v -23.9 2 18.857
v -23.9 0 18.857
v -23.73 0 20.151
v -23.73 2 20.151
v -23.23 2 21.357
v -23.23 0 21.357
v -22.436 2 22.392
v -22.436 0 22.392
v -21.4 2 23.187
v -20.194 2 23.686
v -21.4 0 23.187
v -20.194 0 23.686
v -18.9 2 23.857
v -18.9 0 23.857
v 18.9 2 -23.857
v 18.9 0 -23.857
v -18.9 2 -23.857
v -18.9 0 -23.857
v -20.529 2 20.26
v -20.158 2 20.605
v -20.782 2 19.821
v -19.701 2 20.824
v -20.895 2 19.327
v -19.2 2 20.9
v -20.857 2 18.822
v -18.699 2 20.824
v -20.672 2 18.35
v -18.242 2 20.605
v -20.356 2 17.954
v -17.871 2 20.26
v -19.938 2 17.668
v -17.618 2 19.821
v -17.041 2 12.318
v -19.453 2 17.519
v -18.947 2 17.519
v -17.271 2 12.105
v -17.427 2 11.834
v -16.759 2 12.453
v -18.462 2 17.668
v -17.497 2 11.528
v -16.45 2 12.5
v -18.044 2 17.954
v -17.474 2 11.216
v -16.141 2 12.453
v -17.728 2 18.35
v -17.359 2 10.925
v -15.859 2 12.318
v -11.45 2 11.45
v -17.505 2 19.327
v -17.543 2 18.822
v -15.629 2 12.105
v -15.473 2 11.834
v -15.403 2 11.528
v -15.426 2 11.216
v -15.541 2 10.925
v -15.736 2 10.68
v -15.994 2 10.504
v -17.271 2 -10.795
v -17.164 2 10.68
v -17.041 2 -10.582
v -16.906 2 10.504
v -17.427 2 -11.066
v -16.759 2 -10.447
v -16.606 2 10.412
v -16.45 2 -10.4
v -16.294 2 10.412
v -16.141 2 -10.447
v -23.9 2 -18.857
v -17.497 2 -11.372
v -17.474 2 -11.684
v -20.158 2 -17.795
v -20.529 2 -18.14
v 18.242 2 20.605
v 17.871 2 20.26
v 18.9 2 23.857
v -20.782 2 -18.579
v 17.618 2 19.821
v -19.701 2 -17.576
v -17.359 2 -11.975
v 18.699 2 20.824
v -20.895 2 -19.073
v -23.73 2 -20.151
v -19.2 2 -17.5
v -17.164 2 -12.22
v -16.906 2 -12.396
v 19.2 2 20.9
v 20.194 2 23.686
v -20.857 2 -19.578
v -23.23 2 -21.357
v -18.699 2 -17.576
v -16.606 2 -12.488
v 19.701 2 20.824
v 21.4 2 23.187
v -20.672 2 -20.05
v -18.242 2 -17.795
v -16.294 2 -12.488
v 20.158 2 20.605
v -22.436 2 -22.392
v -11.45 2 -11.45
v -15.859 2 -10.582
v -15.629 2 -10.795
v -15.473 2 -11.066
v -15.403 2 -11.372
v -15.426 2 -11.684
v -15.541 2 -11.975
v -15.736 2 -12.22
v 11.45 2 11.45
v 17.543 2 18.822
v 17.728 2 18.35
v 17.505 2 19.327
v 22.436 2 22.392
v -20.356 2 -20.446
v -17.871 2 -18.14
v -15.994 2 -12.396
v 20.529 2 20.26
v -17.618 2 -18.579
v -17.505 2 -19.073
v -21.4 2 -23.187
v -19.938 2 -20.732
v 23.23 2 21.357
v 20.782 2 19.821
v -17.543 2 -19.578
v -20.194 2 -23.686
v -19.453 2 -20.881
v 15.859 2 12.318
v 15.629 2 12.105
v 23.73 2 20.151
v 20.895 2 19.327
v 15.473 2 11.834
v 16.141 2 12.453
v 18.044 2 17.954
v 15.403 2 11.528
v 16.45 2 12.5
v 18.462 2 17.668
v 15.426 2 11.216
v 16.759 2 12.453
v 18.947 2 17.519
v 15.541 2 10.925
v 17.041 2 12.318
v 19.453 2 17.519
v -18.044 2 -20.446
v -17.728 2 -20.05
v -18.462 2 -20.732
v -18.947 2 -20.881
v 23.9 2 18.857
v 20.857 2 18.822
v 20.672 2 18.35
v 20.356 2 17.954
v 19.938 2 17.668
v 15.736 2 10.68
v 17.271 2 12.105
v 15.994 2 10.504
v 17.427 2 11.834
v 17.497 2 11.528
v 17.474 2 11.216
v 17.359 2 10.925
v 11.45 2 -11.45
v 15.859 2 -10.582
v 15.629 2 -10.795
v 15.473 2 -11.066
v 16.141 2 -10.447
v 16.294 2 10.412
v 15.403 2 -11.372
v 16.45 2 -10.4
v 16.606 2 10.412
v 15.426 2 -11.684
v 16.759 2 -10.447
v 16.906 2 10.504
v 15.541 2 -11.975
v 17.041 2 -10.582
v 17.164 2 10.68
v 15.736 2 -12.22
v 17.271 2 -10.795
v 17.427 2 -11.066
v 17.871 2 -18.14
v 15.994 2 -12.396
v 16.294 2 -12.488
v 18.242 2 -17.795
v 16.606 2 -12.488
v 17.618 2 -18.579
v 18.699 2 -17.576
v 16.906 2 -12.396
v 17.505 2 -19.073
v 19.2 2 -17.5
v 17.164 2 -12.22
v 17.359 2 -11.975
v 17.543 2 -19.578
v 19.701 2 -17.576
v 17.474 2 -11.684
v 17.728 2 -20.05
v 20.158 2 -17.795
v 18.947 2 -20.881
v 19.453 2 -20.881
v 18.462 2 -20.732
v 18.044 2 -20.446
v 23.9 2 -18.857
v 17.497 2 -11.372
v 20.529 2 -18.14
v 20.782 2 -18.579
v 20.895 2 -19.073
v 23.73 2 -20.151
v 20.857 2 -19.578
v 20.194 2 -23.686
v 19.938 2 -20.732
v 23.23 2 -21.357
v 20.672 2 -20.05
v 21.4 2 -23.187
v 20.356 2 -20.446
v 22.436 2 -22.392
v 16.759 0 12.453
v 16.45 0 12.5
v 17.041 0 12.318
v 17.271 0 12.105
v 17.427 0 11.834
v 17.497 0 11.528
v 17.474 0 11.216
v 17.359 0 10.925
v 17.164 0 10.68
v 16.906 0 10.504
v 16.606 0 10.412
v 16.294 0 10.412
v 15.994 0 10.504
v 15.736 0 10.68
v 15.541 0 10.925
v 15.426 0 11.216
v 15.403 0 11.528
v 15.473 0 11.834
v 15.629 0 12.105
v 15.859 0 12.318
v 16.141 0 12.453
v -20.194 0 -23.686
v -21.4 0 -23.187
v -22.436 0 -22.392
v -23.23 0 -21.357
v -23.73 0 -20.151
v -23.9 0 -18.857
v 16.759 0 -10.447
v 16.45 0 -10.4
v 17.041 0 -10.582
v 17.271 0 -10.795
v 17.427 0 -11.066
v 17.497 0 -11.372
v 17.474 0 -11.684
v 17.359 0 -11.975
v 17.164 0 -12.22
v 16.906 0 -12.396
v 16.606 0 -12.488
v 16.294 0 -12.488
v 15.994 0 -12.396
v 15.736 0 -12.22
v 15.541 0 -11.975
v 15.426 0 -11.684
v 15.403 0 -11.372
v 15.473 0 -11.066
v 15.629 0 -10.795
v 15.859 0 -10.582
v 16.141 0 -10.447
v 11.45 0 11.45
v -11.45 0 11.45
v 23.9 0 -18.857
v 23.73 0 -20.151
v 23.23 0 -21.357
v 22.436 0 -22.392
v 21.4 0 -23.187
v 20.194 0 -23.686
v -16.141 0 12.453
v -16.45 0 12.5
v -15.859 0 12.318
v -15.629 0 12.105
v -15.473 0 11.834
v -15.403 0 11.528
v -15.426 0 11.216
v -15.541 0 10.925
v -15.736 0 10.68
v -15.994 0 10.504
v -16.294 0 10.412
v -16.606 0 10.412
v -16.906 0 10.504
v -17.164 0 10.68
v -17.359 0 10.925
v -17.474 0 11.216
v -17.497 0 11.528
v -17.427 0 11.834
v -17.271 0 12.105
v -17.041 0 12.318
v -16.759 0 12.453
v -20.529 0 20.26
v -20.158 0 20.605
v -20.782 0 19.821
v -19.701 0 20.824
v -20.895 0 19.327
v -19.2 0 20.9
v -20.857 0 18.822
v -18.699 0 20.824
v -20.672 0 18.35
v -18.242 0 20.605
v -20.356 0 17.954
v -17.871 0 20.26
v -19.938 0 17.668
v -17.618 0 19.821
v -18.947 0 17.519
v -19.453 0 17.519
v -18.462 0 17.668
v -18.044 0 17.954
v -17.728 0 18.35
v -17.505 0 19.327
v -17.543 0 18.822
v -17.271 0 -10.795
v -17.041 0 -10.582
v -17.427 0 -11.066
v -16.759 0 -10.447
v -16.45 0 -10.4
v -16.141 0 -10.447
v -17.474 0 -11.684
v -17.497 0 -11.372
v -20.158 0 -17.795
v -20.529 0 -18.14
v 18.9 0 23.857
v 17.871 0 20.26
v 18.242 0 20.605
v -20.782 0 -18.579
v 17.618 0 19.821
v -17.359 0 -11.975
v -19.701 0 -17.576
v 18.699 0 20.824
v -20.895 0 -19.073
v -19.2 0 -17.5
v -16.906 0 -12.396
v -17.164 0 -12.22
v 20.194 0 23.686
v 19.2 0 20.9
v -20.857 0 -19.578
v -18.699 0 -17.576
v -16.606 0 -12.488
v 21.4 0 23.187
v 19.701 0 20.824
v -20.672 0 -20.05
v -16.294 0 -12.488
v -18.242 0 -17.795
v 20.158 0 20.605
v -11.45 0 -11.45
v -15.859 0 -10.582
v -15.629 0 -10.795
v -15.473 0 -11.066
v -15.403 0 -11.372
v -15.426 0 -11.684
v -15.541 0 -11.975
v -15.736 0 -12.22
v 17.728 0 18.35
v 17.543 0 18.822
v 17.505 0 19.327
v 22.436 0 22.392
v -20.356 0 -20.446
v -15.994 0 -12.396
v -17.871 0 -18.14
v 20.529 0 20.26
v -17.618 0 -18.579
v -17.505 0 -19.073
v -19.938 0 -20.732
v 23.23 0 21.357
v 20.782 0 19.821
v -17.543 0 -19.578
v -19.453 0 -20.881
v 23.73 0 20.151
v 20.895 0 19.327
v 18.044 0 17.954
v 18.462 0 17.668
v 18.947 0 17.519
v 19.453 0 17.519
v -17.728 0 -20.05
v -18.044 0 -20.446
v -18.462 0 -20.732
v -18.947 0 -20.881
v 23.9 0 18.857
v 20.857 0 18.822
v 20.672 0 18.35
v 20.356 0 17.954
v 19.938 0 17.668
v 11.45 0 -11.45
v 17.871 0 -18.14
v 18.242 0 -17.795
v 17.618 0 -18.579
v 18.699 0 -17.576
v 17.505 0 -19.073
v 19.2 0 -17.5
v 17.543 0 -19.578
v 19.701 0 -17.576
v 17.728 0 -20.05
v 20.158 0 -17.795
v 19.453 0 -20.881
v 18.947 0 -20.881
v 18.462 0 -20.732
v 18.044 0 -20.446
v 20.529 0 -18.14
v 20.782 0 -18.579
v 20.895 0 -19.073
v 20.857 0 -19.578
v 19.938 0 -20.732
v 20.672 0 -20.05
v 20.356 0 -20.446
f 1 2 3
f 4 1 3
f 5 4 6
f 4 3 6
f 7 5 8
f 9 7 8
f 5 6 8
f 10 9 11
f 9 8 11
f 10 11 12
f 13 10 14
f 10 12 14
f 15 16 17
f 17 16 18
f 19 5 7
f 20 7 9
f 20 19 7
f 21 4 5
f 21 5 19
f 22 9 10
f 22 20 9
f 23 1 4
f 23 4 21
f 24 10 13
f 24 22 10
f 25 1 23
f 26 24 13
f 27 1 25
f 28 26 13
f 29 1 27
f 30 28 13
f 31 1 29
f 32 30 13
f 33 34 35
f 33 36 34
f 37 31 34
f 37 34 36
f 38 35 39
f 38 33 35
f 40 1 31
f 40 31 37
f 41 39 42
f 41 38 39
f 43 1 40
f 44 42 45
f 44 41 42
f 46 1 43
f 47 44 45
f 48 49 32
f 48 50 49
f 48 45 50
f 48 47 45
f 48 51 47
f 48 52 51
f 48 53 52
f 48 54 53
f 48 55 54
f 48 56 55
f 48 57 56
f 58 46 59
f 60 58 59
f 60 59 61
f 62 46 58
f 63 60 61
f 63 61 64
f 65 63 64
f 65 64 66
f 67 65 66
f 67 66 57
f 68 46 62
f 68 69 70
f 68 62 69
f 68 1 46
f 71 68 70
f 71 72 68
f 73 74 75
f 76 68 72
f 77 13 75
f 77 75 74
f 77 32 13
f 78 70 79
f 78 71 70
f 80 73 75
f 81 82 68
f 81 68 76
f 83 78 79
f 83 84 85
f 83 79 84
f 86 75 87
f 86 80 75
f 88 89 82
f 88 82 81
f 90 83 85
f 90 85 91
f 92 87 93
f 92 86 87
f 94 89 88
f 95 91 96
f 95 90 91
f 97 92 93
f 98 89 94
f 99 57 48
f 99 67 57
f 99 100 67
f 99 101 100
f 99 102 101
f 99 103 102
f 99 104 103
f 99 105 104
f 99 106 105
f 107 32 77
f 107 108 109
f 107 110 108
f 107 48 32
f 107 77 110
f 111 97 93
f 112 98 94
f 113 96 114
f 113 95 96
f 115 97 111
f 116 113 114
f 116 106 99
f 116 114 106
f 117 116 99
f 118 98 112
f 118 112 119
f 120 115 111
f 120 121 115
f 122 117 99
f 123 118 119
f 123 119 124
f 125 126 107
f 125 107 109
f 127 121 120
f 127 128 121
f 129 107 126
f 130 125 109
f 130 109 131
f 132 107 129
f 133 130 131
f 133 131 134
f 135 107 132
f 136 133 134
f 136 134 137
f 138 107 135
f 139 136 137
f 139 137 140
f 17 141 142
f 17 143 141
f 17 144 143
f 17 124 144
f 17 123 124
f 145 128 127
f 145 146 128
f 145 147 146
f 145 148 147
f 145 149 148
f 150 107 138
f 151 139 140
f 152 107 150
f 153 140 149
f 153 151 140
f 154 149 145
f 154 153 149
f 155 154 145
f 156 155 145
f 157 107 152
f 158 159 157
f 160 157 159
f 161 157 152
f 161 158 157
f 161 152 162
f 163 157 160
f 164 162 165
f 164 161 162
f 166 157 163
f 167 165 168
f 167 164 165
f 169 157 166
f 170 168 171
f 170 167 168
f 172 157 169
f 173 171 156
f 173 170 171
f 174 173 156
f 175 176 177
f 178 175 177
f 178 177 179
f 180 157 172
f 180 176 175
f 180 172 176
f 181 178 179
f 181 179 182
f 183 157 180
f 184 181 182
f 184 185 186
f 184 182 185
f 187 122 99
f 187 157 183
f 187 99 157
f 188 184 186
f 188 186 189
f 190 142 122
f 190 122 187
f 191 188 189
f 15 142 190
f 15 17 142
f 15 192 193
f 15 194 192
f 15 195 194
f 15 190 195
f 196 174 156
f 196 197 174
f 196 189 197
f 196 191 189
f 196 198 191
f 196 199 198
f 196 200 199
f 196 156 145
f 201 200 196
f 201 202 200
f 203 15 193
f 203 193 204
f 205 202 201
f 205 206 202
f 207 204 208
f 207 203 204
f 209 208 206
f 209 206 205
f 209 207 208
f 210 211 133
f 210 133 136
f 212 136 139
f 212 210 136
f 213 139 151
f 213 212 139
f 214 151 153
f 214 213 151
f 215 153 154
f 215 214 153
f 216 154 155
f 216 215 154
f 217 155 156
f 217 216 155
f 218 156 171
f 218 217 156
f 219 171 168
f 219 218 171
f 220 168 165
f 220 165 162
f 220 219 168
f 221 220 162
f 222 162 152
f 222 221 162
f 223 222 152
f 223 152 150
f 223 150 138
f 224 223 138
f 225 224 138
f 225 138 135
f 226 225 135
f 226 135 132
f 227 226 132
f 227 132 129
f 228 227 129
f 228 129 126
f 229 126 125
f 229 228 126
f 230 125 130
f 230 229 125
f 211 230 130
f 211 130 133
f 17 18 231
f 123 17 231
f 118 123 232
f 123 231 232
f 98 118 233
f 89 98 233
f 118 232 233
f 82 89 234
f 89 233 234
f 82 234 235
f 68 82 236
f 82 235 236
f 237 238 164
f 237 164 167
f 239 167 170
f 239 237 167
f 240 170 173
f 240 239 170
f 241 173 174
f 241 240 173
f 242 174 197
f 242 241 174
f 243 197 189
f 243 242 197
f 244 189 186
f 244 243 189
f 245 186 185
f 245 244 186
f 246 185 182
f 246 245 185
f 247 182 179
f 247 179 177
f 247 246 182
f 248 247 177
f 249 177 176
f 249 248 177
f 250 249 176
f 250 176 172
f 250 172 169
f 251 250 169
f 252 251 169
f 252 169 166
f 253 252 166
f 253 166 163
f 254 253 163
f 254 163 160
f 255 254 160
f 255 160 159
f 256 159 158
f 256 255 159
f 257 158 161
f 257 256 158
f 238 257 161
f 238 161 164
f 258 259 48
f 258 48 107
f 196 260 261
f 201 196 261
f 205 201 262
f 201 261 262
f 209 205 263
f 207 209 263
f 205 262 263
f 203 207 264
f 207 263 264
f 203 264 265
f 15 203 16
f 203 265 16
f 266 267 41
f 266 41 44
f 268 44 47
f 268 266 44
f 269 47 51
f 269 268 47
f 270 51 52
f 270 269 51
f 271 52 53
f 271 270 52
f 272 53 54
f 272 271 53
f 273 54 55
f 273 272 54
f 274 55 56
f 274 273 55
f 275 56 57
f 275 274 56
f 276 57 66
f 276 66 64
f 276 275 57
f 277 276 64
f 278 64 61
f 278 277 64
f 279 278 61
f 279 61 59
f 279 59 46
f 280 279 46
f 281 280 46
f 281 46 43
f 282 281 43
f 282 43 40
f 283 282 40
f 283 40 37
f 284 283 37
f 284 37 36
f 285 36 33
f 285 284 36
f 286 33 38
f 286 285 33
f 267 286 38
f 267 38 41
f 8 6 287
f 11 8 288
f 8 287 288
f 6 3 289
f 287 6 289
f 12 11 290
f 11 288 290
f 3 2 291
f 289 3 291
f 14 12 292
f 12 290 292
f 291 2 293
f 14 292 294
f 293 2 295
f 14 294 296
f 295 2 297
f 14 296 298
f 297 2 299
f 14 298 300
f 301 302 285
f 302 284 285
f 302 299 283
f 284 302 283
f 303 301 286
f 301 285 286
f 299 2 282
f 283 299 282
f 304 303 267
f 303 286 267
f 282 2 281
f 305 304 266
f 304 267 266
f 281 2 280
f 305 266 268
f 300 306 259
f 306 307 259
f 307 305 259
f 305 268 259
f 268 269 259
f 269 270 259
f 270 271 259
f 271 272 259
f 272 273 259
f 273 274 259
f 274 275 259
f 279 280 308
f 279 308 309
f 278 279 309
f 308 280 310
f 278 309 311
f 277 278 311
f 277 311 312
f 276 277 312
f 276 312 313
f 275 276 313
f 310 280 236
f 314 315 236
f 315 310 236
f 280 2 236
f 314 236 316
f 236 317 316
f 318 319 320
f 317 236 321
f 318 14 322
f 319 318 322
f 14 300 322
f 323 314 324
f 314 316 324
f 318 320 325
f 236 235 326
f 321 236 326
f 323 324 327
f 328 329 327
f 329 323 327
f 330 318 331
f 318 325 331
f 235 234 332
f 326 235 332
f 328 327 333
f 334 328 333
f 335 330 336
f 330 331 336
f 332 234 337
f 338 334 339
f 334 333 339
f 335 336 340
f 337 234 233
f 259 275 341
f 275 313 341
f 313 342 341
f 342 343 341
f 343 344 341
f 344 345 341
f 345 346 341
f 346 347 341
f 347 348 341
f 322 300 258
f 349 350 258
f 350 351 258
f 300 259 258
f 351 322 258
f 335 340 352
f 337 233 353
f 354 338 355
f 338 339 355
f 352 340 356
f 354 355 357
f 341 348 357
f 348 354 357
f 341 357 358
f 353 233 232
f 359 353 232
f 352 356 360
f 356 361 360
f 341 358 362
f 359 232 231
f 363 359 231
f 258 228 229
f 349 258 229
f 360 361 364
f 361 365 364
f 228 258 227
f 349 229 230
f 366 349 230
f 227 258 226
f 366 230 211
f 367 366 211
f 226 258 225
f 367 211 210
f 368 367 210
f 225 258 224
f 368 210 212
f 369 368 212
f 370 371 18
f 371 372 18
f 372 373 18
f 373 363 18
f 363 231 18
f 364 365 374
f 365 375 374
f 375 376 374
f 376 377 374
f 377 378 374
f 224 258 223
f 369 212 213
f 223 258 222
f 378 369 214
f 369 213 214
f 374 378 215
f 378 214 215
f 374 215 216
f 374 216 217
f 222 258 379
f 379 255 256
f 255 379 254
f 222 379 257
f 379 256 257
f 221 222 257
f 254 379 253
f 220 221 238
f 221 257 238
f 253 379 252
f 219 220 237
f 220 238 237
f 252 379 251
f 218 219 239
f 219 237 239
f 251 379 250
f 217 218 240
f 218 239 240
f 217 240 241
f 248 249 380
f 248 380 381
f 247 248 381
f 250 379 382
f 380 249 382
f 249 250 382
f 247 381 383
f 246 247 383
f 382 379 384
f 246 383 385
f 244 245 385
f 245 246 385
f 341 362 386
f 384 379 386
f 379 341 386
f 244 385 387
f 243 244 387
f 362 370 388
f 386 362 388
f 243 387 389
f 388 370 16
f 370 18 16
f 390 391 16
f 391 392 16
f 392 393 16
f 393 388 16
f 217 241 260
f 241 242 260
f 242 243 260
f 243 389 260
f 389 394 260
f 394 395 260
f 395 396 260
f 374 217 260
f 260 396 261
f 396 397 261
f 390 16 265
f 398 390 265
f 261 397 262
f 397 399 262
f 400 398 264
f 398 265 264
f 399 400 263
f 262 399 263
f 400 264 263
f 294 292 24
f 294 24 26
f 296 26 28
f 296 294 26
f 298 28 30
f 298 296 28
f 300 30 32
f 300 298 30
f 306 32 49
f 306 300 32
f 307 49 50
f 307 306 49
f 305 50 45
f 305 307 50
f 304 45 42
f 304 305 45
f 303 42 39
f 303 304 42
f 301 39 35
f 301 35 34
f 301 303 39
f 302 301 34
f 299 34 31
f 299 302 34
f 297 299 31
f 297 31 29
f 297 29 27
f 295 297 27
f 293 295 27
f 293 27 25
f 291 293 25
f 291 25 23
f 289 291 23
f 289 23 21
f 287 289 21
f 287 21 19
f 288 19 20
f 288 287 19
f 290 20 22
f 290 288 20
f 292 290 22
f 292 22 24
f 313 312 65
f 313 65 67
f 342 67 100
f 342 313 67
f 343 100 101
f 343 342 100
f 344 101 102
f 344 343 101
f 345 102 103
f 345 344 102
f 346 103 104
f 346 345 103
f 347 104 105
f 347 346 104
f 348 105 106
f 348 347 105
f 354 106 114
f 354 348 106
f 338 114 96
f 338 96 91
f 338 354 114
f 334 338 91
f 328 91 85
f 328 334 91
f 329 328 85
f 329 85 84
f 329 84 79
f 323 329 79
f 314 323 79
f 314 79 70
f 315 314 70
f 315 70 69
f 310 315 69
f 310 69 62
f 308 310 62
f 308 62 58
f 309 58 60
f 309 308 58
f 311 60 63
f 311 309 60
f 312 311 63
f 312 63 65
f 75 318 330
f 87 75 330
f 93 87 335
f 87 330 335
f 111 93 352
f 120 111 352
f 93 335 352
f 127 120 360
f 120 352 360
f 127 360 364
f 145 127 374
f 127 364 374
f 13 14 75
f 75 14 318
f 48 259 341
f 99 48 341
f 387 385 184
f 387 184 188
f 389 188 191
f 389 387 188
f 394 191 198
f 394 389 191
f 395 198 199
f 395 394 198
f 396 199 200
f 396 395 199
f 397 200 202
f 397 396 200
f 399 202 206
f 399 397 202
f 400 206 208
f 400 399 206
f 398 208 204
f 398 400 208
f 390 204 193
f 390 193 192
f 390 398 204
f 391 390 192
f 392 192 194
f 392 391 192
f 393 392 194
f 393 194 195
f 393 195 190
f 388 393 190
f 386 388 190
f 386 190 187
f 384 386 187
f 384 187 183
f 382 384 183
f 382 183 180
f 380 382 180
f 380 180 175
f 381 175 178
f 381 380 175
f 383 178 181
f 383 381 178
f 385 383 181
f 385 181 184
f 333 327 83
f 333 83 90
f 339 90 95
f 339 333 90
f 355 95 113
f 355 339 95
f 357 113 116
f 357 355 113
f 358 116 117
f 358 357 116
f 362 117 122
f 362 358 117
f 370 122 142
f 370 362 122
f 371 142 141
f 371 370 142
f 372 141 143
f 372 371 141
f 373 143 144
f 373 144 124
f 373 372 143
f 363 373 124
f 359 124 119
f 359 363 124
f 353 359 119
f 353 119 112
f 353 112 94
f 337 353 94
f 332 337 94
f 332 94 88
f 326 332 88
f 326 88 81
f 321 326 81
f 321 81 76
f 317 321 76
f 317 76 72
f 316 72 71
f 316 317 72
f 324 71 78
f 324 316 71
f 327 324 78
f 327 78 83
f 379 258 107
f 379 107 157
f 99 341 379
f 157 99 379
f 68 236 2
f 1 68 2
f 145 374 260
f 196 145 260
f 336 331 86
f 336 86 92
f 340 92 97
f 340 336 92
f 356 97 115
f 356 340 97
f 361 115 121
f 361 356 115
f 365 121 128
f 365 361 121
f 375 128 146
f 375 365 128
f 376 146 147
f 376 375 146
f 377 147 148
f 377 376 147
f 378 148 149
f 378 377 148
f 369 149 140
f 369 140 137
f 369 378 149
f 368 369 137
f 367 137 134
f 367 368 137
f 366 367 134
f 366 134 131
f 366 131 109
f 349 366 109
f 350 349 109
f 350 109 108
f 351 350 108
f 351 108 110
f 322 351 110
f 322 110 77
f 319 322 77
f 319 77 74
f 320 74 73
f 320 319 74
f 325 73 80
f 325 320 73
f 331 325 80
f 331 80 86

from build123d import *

# Parameters (mm, degrees)
SKETCH_1_R      = 1.7
SKETCH_1_R_2    = 1.05
SKETCH_1_W      = 22.9
SKETCH_1_H      = 22.9
EXTRUDE_1_DEPTH = 2


with BuildPart() as part:
    # 草图1 → 凸台-拉伸1 (new body)
    with BuildSketch(Plane(origin=(0, 0, 0), x_dir=(1, 0, 0), z_dir=(0, 1, 0))):
        with BuildLine():
            ThreePointArc((-23.9, -18.856654127), (-22.435533906, -22.392188032), (-18.9, -23.856654127))
            Line((-18.9, -23.856654127), (18.9, -23.856654127))
            ThreePointArc((18.9, -23.856654127), (22.435533906, -22.392188032), (23.9, -18.856654127))
            Line((23.9, -18.856654127), (23.9, -0.043345873))
            Line((23.9, -0.043345873), (23.9, 0.043345873))
            Line((23.9, 0.043345873), (23.9, 18.856654127))
            ThreePointArc((23.9, 18.856654127), (22.435533906, 22.392188032), (18.9, 23.856654127))
            Line((18.9, 23.856654127), (-18.9, 23.856654127))
            ThreePointArc((-18.9, 23.856654127), (-22.435533906, 22.392188032), (-23.9, 18.856654127))
            Line((-23.9, 18.856654127), (-23.9, 0.043345873))
            Line((-23.9, 0.043345873), (-23.9, -0.043345873))
            Line((-23.9, -0.043345873), (-23.9, -18.856654127))
        make_face()
        with Locations(Location((-19.2, -19.2, 0), (0, 0, 270))):
            Circle(SKETCH_1_R, mode=Mode.SUBTRACT)
        with Locations(Location((-16.45, -11.45, 0), (0, 0, 270))):
            Circle(SKETCH_1_R_2, mode=Mode.SUBTRACT)
        with Locations(Location((19.2, -19.2, 0), (0, 0, 270))):
            Circle(SKETCH_1_R, mode=Mode.SUBTRACT)
        Rectangle(SKETCH_1_W, SKETCH_1_H, mode=Mode.SUBTRACT)
        with Locations(Location((16.45, -11.45, 0), (0, 0, 270))):
            Circle(SKETCH_1_R_2, mode=Mode.SUBTRACT)
        with Locations(Location((-16.45, 11.45, 0), (0, 0, 270))):
            Circle(SKETCH_1_R_2, mode=Mode.SUBTRACT)
        with Locations(Location((-19.2, 19.2, 0), (0, 0, 270))):
            Circle(SKETCH_1_R, mode=Mode.SUBTRACT)
        with Locations(Location((16.45, 11.45, 0), (0, 0, 270))):
            Circle(SKETCH_1_R_2, mode=Mode.SUBTRACT)
        with Locations(Location((19.2, 19.2, 0), (0, 0, 270))):
            Circle(SKETCH_1_R, mode=Mode.SUBTRACT)
    extrude(amount=EXTRUDE_1_DEPTH)


solid = part.part
